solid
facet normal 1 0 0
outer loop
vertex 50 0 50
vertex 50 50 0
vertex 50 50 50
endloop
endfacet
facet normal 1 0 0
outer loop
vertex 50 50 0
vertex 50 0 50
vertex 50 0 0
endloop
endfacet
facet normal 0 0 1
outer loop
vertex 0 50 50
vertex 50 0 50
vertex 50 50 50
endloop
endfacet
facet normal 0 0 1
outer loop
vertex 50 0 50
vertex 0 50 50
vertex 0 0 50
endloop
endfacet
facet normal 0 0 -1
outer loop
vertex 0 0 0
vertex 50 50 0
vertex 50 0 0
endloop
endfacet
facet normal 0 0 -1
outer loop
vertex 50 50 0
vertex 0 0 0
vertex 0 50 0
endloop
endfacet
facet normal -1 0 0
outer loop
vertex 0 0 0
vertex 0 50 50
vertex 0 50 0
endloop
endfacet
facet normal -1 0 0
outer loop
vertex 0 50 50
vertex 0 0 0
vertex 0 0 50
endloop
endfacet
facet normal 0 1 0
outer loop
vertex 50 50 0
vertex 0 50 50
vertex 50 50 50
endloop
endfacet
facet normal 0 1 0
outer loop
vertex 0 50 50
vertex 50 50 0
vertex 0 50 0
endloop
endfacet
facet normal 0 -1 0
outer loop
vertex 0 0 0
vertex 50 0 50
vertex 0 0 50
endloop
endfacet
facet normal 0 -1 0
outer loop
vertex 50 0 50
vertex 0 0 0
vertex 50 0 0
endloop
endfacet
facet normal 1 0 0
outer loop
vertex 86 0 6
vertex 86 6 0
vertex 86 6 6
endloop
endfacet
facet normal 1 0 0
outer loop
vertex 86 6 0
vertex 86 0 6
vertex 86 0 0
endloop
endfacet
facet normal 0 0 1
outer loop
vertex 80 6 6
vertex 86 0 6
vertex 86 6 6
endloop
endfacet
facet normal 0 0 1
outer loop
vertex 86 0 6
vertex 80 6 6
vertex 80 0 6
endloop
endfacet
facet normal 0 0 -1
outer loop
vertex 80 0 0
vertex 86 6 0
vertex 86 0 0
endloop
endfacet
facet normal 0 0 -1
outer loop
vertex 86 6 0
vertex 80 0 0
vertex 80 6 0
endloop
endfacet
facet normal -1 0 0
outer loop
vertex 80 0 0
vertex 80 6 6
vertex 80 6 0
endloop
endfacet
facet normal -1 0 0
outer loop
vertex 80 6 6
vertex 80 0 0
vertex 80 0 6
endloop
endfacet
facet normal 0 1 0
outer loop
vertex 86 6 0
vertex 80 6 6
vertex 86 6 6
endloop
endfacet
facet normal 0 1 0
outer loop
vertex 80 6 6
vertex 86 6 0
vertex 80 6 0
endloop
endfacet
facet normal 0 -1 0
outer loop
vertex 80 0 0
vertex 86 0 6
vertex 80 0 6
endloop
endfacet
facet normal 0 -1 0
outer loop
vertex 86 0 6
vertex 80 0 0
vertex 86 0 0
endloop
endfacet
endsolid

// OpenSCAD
// Scope semantics: the LAST assignment in a scope governs the WHOLE scope,
// including the lines textually above it. The corpus had no case on this at all.
//
// WHAT IT WOULD CATCH. OpenSCAD is not imperative. `scad.ts` used to execute
// assignments in the same top-to-bottom sweep as the geometry, so the first
// assignment governed every line above the second one: the first three lines
// below were a **10 mm cube here and a 50 mm cube in OpenSCAD** — a dimension
// that appears nowhere in the file the user is reading, with no diagnostic.
//
// ⚠ AND IT IS NOT "EVALUATE THE LAST ONE", WHICH IS THE HALF A REWRITE GETS
// WRONG. The name keeps the POSITION of its FIRST assignment and takes the
// EXPRESSION of its LAST, and everything is then evaluated once in that order.
// So `a = 1; b = a + 1; a = 5;` gives `b == 6`, not 2 and not undef. The second
// solid is that probe: a rule that merely moved `a` to the bottom of the scope
// would give `b == undef` and draw nothing.
//
// WHY IT WAS CHOSEN. Every variable case in the corpus (`variables`,
// `variables_expr`, `variables_function_def`) assigns each name exactly once, so
// the entire re-assignment rule — which is the one that decides what a
// dimension MEANS — was unexercised. OpenSCAD warns about both overwrites and
// this file expects those warnings; they are not errors and change no geometry.
//
// Decidability: the 50 mm cube sits at the origin and the 6 mm cube at x = 80,
// so the two bounding boxes cannot touch.
//
// PLANTED AND WATCHED RED (throwaway copy, openscad 2026.08.07):
//   · the FIRST assignment's expression kept instead of the last -> DIVERGES
w = 10;
module part() { cube([w, w, w]); }
part();
w = 50;

a = 1;
b = a + 1;
a = 5;
translate([80, 0, 0]) cube([b, b, b]);
